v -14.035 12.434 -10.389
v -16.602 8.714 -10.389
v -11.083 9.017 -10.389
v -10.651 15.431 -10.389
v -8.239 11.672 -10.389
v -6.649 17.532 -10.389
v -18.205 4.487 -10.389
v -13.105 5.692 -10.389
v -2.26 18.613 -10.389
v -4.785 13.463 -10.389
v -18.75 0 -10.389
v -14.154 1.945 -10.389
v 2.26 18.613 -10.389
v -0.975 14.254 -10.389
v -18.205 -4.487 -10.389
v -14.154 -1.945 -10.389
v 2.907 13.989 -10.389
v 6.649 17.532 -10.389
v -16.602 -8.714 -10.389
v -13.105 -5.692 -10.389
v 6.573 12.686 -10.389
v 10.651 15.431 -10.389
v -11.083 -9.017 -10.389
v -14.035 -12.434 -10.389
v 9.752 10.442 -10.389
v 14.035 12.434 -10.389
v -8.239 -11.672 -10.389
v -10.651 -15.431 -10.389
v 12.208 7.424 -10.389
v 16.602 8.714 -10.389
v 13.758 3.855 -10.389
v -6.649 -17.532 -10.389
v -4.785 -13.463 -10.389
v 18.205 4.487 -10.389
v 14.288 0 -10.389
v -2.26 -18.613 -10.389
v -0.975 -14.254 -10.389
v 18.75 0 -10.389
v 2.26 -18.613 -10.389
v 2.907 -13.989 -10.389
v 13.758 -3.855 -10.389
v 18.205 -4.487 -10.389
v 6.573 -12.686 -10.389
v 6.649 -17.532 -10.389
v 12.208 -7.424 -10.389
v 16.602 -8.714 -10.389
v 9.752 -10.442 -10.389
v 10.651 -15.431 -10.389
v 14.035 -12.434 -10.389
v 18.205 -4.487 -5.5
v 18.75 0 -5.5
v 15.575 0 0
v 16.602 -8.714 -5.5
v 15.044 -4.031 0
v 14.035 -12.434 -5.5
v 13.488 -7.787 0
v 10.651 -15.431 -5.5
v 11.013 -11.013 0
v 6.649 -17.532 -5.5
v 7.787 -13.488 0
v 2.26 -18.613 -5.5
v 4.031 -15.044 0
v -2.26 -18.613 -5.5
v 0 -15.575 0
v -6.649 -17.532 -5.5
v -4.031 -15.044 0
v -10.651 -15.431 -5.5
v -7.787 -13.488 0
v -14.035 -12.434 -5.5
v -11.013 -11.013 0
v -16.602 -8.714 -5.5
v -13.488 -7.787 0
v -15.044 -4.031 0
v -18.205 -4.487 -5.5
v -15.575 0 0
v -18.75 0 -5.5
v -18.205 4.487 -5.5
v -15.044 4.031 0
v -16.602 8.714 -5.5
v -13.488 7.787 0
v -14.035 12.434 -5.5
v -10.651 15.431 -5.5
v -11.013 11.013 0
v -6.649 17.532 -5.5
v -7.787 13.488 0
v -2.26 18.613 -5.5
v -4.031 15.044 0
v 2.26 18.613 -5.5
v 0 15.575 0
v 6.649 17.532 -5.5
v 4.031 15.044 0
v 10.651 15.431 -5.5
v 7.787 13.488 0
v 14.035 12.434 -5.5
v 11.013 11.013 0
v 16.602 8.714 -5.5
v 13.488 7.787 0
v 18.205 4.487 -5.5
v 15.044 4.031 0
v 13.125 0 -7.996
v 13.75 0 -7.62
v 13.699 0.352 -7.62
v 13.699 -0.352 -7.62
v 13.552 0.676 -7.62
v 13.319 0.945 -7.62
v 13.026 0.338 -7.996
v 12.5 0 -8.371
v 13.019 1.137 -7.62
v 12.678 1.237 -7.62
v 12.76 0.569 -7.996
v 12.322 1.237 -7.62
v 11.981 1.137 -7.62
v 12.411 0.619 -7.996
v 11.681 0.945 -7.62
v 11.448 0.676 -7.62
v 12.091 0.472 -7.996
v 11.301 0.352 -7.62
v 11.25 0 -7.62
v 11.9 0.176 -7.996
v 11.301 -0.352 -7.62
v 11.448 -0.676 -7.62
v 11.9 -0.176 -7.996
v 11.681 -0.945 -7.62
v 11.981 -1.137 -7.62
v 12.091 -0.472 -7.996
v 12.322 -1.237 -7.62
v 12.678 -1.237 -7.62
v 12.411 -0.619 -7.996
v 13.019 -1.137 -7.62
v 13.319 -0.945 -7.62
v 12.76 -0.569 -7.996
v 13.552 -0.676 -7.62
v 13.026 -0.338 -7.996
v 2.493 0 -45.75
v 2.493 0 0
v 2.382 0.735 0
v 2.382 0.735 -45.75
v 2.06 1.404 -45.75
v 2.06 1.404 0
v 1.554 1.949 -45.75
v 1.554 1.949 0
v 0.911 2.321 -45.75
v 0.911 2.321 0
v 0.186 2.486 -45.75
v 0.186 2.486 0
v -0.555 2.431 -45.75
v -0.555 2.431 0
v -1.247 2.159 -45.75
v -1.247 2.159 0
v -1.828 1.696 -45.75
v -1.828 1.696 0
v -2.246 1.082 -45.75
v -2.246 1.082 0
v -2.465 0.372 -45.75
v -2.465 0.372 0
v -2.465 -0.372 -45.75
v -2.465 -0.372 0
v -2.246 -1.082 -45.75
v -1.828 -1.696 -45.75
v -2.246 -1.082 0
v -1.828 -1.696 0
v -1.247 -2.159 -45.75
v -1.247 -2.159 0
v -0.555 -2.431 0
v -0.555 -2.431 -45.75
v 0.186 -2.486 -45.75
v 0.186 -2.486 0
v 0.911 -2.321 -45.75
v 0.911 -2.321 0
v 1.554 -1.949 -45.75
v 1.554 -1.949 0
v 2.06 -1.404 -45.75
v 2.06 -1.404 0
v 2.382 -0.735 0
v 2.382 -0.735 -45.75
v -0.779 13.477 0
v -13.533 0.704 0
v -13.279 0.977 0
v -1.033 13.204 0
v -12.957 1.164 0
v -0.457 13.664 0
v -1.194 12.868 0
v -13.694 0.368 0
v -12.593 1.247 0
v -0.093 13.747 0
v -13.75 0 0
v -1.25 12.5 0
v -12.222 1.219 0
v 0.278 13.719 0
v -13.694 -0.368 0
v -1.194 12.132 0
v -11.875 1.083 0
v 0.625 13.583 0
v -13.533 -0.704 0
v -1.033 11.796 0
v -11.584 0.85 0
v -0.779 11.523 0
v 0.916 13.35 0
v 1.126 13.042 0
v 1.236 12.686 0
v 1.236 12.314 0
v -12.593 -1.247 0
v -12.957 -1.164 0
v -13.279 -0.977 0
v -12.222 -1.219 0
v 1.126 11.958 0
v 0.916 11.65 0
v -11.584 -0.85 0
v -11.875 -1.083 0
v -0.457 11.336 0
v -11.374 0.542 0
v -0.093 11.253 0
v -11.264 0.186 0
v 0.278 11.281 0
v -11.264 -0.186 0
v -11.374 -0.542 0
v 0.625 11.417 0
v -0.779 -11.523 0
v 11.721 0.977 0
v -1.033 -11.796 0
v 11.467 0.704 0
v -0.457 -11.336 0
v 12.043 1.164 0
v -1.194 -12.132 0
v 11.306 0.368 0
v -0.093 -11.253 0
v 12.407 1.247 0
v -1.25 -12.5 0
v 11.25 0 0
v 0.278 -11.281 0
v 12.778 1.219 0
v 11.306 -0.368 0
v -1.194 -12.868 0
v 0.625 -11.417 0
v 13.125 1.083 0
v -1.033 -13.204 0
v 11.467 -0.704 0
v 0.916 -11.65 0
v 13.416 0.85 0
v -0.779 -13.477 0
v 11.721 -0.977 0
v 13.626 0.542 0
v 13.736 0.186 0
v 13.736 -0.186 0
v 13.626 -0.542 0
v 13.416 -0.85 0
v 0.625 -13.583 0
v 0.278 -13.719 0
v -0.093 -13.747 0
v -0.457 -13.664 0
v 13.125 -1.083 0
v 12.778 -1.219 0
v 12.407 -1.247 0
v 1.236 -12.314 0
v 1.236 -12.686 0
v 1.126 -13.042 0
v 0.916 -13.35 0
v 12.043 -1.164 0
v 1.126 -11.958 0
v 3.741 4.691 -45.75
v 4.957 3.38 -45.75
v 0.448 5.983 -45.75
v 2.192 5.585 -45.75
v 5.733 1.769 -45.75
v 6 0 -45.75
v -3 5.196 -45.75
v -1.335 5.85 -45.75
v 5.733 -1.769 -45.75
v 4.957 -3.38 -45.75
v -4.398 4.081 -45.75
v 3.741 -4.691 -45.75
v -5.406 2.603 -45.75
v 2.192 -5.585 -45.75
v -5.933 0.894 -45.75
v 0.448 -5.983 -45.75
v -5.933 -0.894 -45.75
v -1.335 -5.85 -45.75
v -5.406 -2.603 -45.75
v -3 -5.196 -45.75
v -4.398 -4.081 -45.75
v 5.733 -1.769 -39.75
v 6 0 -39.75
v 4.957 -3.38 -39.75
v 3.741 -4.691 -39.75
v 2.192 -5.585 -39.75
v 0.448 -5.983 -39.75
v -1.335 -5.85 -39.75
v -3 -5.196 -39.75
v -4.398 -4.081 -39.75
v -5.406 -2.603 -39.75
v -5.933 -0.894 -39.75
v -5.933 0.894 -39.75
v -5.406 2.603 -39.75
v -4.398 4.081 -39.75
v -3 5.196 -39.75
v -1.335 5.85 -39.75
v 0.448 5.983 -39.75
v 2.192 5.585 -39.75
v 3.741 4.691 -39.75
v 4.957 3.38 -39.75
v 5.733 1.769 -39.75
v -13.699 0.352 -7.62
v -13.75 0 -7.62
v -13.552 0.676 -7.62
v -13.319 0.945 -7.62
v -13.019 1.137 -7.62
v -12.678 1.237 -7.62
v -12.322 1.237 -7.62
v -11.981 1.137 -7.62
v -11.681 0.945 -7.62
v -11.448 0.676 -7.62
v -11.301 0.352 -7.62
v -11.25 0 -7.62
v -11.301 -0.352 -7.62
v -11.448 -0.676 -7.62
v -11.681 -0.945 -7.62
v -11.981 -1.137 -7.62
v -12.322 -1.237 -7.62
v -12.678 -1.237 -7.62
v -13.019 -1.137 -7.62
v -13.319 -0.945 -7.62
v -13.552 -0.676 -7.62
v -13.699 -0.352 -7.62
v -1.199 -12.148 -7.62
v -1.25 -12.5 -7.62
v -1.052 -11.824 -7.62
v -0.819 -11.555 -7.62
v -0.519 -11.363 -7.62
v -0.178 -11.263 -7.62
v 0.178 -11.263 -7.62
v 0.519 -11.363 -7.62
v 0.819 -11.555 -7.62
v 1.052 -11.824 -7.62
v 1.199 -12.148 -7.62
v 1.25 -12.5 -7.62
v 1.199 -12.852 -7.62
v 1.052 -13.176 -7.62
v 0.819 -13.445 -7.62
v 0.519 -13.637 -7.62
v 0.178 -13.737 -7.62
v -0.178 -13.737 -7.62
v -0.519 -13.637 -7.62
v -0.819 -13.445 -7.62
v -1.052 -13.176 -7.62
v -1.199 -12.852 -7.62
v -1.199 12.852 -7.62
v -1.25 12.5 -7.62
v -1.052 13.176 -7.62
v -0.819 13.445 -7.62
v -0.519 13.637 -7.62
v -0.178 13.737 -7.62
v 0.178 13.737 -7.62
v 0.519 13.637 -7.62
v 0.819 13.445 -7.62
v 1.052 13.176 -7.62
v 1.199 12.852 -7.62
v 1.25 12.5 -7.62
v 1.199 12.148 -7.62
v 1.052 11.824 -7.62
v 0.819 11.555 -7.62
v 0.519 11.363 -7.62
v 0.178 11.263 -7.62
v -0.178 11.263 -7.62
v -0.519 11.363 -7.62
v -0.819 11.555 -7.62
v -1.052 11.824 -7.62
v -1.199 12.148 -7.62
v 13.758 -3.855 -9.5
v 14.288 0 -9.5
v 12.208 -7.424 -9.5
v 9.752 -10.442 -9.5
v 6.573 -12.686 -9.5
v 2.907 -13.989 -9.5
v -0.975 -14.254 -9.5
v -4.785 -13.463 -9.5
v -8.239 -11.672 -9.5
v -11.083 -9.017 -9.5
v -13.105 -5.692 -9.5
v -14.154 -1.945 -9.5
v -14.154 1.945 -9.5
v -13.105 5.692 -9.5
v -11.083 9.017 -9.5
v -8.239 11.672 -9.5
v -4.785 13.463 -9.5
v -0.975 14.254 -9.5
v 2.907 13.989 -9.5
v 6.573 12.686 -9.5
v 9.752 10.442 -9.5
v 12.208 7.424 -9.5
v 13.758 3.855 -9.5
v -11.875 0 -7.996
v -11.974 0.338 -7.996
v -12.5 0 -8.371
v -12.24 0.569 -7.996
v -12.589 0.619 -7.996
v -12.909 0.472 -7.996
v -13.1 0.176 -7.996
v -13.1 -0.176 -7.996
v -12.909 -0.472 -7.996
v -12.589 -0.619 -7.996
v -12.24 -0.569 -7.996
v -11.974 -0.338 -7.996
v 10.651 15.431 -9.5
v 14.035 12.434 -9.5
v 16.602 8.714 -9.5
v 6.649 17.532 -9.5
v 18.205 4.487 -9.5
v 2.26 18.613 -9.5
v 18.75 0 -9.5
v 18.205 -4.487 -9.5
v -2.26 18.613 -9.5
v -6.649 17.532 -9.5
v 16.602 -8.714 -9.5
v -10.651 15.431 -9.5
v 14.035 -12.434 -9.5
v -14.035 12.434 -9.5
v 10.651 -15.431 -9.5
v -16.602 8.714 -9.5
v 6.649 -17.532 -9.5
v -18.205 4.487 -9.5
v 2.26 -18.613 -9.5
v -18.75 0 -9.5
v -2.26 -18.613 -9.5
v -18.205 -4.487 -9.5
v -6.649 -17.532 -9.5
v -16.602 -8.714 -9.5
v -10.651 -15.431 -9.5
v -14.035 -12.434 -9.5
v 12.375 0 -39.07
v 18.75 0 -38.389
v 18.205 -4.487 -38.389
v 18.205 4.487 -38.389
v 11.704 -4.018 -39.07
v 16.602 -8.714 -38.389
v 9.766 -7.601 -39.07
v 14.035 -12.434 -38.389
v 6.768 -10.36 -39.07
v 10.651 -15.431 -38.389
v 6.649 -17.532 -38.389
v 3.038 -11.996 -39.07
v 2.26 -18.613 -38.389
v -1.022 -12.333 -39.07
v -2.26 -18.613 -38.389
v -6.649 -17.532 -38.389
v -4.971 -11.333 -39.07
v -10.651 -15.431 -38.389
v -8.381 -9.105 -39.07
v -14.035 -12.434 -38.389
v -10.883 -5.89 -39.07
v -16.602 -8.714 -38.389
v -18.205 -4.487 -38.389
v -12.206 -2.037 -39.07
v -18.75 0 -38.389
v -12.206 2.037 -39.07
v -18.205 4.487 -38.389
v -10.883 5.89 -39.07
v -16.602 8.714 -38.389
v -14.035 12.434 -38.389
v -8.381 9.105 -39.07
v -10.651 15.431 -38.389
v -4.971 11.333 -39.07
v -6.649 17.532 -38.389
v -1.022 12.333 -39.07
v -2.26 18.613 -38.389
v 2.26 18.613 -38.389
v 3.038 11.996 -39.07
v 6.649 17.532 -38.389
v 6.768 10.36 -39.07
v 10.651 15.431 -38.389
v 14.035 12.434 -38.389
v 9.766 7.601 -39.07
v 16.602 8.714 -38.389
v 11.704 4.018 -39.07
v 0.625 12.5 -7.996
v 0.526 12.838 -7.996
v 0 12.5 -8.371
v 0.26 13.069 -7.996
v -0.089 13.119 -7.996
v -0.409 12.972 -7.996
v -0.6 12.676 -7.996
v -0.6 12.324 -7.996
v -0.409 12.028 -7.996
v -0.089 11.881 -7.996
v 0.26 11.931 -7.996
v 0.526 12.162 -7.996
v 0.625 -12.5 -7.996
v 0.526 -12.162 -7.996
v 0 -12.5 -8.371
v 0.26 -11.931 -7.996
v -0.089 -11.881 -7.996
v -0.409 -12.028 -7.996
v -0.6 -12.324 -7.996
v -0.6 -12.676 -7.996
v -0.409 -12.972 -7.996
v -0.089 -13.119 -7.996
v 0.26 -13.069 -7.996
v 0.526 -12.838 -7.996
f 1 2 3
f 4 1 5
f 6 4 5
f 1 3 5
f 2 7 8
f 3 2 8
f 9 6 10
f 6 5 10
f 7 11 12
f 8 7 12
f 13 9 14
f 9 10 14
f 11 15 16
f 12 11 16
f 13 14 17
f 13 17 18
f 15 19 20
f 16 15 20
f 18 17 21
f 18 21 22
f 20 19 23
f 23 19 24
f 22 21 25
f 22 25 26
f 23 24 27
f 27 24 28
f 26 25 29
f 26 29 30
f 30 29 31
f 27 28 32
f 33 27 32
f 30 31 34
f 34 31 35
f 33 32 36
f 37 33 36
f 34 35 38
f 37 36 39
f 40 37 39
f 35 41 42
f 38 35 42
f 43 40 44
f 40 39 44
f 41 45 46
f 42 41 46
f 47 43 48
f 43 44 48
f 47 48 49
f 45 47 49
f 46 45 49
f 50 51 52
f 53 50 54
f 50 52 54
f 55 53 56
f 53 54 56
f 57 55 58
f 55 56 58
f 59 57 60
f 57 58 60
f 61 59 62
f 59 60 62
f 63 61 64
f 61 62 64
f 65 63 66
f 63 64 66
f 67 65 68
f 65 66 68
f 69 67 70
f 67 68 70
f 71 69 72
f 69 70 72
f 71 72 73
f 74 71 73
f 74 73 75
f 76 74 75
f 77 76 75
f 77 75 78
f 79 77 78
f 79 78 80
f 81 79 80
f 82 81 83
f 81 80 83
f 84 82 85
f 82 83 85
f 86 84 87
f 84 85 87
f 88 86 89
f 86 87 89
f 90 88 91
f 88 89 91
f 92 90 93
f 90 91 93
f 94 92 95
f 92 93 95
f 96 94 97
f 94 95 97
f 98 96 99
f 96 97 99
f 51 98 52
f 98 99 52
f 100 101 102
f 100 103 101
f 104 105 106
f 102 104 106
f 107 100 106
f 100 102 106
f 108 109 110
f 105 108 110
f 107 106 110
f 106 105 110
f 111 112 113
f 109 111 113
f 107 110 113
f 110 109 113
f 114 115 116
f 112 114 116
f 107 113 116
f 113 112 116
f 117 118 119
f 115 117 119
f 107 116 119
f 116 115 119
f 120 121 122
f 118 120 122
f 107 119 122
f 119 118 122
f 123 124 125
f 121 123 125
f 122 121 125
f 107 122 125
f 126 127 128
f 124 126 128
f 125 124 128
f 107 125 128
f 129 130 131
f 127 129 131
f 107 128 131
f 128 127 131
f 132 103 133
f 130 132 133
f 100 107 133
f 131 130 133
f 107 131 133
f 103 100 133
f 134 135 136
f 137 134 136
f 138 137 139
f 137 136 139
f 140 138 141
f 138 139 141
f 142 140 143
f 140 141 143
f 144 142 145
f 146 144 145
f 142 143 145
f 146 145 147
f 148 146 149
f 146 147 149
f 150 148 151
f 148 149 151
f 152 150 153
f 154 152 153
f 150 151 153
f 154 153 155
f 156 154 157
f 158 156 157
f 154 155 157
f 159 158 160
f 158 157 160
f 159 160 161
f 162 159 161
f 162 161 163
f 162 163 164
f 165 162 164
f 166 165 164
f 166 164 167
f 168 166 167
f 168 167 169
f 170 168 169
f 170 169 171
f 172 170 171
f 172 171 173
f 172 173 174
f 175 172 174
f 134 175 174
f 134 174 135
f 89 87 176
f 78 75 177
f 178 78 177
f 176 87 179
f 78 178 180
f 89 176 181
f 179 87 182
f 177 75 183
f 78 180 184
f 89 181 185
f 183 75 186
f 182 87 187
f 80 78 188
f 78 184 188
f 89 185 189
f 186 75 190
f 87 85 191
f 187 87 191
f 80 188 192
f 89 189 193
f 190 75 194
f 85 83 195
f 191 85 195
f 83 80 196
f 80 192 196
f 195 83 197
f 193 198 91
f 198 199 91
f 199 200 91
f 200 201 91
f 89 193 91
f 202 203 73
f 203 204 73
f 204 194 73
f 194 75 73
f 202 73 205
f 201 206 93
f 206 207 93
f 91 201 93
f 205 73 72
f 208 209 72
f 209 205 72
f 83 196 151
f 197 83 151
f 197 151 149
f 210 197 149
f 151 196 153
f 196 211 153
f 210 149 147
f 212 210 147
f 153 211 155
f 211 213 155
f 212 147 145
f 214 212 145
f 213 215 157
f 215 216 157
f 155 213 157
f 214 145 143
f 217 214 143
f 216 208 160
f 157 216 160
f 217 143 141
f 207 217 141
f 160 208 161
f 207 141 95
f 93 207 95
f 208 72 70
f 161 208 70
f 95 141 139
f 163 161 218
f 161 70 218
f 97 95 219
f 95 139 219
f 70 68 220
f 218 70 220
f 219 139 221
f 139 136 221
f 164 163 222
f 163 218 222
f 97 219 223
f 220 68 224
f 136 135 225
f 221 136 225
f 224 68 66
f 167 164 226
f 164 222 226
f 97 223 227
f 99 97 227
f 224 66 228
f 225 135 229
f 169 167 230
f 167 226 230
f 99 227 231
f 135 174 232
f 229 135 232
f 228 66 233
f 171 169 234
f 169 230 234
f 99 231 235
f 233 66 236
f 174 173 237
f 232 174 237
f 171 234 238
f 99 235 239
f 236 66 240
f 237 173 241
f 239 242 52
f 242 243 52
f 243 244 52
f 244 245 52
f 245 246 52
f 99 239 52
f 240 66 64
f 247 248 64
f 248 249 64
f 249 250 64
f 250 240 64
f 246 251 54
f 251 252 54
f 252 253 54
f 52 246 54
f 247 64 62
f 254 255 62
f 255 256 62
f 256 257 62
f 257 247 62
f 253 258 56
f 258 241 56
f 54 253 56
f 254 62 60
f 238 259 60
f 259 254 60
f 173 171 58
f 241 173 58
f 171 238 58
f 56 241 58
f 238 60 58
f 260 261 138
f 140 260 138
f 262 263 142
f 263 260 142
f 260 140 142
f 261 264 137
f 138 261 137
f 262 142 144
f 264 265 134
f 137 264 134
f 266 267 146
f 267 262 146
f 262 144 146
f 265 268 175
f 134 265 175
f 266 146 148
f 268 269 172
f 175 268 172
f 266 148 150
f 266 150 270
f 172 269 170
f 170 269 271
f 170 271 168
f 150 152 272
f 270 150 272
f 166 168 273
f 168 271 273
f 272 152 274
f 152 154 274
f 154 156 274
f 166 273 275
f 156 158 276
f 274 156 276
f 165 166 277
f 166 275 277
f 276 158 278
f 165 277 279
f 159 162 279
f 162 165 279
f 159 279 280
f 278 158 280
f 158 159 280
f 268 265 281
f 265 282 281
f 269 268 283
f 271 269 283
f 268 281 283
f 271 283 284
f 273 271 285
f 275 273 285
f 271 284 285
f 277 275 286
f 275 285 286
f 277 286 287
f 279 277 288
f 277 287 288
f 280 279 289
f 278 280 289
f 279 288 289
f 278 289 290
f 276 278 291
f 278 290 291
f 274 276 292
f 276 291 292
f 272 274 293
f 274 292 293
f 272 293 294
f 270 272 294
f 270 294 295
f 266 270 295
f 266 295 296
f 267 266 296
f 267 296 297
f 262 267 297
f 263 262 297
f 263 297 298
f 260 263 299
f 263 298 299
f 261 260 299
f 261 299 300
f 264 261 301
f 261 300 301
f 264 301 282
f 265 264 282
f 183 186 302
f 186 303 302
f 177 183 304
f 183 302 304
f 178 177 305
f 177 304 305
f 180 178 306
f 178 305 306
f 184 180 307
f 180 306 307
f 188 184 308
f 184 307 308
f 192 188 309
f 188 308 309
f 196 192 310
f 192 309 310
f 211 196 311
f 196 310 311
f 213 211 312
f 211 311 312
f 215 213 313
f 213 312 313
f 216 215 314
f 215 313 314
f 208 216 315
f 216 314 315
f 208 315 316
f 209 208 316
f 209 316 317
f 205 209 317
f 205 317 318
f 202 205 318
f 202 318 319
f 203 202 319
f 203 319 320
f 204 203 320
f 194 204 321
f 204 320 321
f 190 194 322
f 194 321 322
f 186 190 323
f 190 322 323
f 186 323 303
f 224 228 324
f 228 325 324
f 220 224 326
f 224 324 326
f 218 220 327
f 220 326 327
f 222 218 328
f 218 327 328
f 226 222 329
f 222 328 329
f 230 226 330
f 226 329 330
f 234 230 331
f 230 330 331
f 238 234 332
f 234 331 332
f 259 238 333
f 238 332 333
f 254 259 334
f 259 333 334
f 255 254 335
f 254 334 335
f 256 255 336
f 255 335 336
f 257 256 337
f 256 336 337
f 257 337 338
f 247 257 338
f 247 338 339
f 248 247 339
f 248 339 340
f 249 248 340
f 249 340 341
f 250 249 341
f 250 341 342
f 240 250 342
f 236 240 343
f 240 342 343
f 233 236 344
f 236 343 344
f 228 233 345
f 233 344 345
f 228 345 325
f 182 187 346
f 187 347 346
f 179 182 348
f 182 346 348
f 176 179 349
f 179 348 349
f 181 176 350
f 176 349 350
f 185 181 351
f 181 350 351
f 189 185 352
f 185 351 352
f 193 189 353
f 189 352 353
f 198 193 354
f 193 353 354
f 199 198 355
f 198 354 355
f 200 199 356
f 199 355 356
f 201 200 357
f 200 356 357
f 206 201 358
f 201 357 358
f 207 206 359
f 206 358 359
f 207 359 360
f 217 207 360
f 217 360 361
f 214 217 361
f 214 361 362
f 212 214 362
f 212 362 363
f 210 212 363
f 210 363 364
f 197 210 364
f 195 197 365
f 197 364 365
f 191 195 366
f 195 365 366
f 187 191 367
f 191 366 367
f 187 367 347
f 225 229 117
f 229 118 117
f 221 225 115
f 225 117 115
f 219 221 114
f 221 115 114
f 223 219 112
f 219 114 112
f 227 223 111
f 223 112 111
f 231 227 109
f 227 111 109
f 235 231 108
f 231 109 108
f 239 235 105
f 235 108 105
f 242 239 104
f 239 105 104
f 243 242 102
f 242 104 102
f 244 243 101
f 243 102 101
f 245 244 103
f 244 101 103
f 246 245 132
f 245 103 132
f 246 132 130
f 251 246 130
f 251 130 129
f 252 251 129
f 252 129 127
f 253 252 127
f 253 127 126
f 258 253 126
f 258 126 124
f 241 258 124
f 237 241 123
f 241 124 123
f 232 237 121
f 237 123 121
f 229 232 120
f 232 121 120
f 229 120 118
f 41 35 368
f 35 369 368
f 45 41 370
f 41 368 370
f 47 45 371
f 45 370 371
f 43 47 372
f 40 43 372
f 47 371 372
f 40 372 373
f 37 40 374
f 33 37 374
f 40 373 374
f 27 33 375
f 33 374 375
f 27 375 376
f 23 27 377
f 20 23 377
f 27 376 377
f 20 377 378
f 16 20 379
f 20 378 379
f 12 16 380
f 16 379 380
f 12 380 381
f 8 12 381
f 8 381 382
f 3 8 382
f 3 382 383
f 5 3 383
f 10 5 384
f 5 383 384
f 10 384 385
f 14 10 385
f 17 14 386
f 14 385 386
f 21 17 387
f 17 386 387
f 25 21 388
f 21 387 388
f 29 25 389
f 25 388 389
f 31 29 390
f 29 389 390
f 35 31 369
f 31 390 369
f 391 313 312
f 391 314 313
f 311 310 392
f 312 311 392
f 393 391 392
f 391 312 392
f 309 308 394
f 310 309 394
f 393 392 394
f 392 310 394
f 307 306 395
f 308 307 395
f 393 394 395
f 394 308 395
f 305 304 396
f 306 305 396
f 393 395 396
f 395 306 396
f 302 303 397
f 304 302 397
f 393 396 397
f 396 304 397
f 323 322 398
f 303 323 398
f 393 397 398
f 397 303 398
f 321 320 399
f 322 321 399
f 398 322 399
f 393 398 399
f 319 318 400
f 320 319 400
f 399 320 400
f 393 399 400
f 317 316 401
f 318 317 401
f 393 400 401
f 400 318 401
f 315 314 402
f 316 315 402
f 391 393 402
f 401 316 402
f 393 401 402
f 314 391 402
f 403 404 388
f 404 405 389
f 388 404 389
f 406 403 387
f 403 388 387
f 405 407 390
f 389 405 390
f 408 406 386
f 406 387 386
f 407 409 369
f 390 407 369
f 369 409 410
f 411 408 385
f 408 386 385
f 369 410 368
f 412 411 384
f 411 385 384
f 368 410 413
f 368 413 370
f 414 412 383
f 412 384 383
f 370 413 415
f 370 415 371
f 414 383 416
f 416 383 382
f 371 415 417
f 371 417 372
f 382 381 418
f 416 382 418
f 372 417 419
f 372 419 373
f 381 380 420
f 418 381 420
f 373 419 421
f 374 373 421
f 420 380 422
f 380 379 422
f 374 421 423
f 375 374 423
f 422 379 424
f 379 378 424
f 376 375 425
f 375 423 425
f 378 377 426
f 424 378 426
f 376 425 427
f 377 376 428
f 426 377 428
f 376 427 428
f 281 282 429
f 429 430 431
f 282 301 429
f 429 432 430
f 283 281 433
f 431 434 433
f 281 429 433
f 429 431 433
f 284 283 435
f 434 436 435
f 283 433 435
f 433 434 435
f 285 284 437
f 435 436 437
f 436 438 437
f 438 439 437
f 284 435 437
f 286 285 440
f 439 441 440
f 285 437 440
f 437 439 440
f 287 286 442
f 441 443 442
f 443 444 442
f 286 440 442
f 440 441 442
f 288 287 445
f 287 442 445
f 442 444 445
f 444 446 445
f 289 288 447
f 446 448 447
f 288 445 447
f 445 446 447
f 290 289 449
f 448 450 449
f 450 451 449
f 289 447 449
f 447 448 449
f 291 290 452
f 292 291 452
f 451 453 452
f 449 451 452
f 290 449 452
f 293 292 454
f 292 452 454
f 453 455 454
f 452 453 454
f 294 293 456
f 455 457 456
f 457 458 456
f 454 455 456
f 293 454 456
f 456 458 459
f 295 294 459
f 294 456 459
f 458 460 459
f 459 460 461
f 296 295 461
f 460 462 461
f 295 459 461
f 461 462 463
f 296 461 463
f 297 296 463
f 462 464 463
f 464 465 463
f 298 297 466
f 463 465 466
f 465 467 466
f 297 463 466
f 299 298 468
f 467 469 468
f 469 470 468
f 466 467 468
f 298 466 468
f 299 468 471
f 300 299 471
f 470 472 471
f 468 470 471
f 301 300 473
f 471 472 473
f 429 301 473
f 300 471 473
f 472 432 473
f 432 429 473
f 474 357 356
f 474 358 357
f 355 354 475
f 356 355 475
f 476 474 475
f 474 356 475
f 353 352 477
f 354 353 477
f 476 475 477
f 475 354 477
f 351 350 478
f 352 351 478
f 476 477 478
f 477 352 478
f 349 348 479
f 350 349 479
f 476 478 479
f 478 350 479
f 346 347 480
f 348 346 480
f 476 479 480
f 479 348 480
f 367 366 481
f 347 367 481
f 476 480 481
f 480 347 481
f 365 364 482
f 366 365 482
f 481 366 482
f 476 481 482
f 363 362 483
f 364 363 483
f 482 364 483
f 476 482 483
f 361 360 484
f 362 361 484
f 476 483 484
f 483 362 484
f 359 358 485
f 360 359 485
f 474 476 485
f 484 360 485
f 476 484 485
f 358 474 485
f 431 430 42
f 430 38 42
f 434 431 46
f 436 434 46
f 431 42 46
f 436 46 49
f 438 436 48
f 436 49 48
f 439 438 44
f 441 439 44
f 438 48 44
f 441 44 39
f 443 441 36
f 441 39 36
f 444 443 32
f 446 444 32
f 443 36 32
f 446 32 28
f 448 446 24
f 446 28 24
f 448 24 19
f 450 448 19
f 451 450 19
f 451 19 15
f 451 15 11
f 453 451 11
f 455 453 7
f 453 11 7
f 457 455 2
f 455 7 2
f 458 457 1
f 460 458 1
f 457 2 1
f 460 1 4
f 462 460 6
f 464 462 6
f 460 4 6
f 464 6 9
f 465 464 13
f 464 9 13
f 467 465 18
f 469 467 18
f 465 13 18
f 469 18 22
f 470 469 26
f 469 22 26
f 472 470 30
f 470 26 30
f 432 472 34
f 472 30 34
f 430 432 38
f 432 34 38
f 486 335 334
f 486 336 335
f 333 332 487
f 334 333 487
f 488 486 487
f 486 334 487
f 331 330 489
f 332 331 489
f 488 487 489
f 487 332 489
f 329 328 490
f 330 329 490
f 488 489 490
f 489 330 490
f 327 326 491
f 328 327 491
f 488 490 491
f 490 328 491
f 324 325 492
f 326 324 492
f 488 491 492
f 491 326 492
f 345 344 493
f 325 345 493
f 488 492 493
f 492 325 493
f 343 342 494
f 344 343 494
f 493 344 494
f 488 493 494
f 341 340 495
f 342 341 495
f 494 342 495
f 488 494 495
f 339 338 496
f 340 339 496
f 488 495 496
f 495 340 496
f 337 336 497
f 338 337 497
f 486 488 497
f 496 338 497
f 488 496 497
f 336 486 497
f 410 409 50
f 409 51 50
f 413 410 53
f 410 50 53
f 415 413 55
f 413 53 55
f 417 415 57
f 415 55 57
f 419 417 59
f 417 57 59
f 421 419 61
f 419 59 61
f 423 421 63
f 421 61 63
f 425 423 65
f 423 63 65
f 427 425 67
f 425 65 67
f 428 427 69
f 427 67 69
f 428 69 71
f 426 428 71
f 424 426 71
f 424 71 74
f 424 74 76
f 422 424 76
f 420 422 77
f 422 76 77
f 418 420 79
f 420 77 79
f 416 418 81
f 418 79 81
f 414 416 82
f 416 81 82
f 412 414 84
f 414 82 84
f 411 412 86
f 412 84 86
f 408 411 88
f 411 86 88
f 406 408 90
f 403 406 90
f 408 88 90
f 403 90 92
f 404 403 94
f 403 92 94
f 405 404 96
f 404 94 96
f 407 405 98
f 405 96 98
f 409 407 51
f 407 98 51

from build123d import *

# Parameters (mm, degrees)
M3X0_5_TAPPED_HOLE1_D     = 2.5
M3X0_5_TAPPED_HOLE1_DEPTH = 7.62
M3X0_5_TAPPED_HOLE1_TIP   = 0.751075774
CUT_EXTRUDE1_REACH        = 54.879
SKETCH5_R                 = 2.49301


with BuildPart() as part:
    # Sketch1 → Revolve1 (revolve)
    with BuildSketch(Plane(origin=(0, 0, 0), x_dir=(0, 0, -1), z_dir=(1, 0, 0)), mode=Mode.PRIVATE) as revolve1_sk:
        Polygon((0, 15.574573519), (0, 0), (45.75, 0), (45.75, 2.49), (45.75, 6), (39.75, 6), (38.389, 18.75), (10.389, 18.75), (10.389, 14.2875), (9.5, 14.2875), (9.5, 18.75), (5.5, 18.75), align=None)
    revolve(revolve1_sk.sketch.rotate(Axis((0, 0, 0), (0, 0, -1)), 90), axis=Axis((0, 0, 0), (0, 0, -1)))

    # M3x0.5 Tapped Hole1
    with Locations(Plane.XY):
        with Locations((0, 12.5), (12.5, 0), (-12.5, 0), (0, -12.5)):
            Hole(M3X0_5_TAPPED_HOLE1_D / 2, depth=M3X0_5_TAPPED_HOLE1_DEPTH)
            with Locations((0, 0, -(M3X0_5_TAPPED_HOLE1_DEPTH + M3X0_5_TAPPED_HOLE1_TIP / 2))):  # 118° drill point
                Cone(0, M3X0_5_TAPPED_HOLE1_D / 2, M3X0_5_TAPPED_HOLE1_TIP, mode=Mode.SUBTRACT)

    # Sketch5 → Cut-Extrude1 (cut, up to next)
    with BuildSketch(Plane.XY, mode=Mode.PRIVATE) as cut_extrude1_sk1:
        Circle(SKETCH5_R)
    cut_extrude1_tool1 = extrude(cut_extrude1_sk1.sketch, amount=-CUT_EXTRUDE1_REACH, mode=Mode.PRIVATE) & part.part
    add(cut_extrude1_tool1.solids().sort_by_distance((0, 0, 0))[0], mode=Mode.SUBTRACT)


solid = part.part
